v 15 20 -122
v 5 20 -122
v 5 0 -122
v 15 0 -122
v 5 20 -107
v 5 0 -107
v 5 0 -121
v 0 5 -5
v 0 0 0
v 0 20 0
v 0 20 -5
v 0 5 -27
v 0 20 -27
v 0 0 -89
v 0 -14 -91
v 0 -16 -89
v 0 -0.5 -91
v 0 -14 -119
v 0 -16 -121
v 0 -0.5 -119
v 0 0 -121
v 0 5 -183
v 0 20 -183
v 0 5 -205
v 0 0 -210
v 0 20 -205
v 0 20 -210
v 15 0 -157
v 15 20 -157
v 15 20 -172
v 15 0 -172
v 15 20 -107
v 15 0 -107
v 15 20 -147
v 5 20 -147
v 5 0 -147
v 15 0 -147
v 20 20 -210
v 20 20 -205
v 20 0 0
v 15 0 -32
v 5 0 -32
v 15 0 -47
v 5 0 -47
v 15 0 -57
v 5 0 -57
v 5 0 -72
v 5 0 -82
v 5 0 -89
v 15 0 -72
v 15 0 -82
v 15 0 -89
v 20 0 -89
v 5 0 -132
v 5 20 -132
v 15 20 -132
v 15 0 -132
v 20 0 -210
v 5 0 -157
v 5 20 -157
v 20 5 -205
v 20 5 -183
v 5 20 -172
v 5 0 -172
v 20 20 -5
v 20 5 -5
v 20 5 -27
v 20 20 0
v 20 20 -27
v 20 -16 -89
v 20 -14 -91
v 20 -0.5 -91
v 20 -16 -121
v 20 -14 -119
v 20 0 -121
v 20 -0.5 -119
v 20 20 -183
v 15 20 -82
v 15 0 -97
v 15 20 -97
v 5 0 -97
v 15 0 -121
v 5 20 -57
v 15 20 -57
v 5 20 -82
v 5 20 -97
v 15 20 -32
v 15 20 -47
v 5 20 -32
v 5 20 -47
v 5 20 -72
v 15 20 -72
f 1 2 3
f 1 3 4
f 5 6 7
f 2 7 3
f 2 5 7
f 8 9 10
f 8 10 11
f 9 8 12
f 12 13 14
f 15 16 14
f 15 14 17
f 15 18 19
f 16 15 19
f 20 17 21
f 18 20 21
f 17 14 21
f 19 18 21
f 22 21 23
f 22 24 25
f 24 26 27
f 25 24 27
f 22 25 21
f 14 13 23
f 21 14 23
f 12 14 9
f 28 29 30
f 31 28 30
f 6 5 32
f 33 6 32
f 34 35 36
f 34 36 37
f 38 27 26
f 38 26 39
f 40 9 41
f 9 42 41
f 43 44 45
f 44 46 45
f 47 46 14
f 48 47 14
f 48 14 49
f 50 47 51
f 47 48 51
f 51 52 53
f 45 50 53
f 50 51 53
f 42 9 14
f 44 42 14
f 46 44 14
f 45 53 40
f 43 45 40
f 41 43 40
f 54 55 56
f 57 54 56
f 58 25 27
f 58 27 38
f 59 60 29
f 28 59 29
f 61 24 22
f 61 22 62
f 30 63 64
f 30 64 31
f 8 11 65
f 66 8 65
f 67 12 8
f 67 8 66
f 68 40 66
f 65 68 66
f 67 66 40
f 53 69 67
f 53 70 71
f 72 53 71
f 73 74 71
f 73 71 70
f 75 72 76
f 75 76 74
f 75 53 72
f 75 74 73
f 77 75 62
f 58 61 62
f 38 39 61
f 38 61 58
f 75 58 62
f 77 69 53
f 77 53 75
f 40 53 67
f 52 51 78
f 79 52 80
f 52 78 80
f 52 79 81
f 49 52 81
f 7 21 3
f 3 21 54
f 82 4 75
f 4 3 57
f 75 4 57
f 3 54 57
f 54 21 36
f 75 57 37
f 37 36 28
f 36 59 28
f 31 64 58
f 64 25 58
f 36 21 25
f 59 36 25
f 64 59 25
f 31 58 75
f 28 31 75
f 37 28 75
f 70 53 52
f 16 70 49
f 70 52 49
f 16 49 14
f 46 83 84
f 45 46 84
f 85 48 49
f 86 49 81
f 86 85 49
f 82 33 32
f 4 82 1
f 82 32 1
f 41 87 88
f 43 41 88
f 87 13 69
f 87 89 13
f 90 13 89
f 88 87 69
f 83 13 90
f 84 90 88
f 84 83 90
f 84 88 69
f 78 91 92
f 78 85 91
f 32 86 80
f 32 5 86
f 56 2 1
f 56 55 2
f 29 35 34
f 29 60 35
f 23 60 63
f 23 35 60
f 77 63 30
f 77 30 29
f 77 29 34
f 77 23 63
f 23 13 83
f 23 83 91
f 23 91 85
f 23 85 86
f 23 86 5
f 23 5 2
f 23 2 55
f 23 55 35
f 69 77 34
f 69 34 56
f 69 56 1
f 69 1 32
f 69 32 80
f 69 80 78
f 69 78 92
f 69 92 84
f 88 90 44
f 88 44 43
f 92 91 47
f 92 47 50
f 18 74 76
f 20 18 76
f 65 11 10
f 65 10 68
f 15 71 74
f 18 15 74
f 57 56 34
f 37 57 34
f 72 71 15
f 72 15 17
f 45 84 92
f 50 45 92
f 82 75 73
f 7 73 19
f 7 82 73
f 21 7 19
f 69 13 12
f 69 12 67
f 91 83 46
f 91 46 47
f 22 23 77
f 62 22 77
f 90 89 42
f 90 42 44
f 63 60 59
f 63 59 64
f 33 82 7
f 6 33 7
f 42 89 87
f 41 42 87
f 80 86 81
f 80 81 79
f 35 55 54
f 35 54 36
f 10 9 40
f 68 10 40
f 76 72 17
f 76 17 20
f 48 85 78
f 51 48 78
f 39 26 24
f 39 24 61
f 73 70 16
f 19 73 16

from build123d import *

# Parameters (mm, degrees)
SKETCH1_W           = 20
SKETCH1_H           = 210
BOSS_EXTRUDE1_DEPTH = 20
SKETCH2_W           = 20
SKETCH2_H           = 22
CUT_EXTRUDE1_DEPTH  = 15
SKETCH3_W           = 20
SKETCH3_H           = 22
CUT_EXTRUDE2_DEPTH  = 15
SKETCH4_W           = 10
SKETCH4_H           = 15
CUT_EXTRUDE3_DEPTH  = 21
SKETCH5_W           = 20
SKETCH5_H           = 32
BOSS_EXTRUDE2_DEPTH = 16
SKETCH6_W           = 28
SKETCH6_H           = 13.5
CUT_EXTRUDE4_DEPTH  = 21


with BuildPart() as part:
    # Sketch1 → Boss-Extrude1 (new body)
    with BuildSketch(Plane(origin=(0, 0, 0), x_dir=(1, 0, 0), z_dir=(0, 1, 0))):
        with Locations((10, 105)):
            Rectangle(SKETCH1_W, SKETCH1_H)
    extrude(amount=BOSS_EXTRUDE1_DEPTH)

    # Sketch2 → Cut-Extrude1 (cut)
    with BuildSketch(Plane(origin=(0, 20, 0), x_dir=(1, 0, 0), z_dir=(0, 1, 0))):
        with Locations((10, 16)):
            Rectangle(SKETCH2_W, SKETCH2_H)
    extrude(amount=-CUT_EXTRUDE1_DEPTH, mode=Mode.SUBTRACT)

    # Sketch3 → Cut-Extrude2 (cut)
    with BuildSketch(Plane(origin=(0, 20, 0), x_dir=(1, 0, 0), z_dir=(0, 1, 0))):
        with Locations((10, 194)):
            Rectangle(SKETCH3_W, SKETCH3_H)
    extrude(amount=-CUT_EXTRUDE2_DEPTH, mode=Mode.SUBTRACT)

    # Sketch4 → Cut-Extrude3 (cut, through all)
    with BuildSketch(Plane(origin=(0, 20, 0), x_dir=(1, 0, 0), z_dir=(0, 1, 0))):
        with Locations((10, 39.5)):
            Rectangle(SKETCH4_W, SKETCH4_H)
        with Locations((10, 64.5)):
            Rectangle(SKETCH4_W, SKETCH4_H)
        with Locations((10, 89.5)):
            Rectangle(SKETCH4_W, SKETCH4_H)
        with Locations((10, 114.5)):
            Rectangle(SKETCH4_W, SKETCH4_H)
        with Locations((10, 139.5)):
            Rectangle(SKETCH4_W, SKETCH4_H)
        with Locations((10, 164.5)):
            Rectangle(SKETCH4_W, SKETCH4_H)
    extrude(amount=-CUT_EXTRUDE3_DEPTH, mode=Mode.SUBTRACT)

    # Sketch5 → Boss-Extrude2 (add)
    with BuildSketch(Plane(origin=(0, 0, 0), x_dir=(-1, 0, 0), z_dir=(0, -1, 0))):
        with Locations((-10, 105)):
            Rectangle(SKETCH5_W, SKETCH5_H)
    extrude(amount=BOSS_EXTRUDE2_DEPTH)

    # Sketch6 → Cut-Extrude4 (cut, through all)
    with BuildSketch(Plane(origin=(20, 0, 0), x_dir=(0, 0, -1), z_dir=(1, 0, 0))):
        with Locations((105, -7.25)):
            Rectangle(SKETCH6_W, SKETCH6_H)
    extrude(amount=-CUT_EXTRUDE4_DEPTH, mode=Mode.SUBTRACT)


solid = part.part
